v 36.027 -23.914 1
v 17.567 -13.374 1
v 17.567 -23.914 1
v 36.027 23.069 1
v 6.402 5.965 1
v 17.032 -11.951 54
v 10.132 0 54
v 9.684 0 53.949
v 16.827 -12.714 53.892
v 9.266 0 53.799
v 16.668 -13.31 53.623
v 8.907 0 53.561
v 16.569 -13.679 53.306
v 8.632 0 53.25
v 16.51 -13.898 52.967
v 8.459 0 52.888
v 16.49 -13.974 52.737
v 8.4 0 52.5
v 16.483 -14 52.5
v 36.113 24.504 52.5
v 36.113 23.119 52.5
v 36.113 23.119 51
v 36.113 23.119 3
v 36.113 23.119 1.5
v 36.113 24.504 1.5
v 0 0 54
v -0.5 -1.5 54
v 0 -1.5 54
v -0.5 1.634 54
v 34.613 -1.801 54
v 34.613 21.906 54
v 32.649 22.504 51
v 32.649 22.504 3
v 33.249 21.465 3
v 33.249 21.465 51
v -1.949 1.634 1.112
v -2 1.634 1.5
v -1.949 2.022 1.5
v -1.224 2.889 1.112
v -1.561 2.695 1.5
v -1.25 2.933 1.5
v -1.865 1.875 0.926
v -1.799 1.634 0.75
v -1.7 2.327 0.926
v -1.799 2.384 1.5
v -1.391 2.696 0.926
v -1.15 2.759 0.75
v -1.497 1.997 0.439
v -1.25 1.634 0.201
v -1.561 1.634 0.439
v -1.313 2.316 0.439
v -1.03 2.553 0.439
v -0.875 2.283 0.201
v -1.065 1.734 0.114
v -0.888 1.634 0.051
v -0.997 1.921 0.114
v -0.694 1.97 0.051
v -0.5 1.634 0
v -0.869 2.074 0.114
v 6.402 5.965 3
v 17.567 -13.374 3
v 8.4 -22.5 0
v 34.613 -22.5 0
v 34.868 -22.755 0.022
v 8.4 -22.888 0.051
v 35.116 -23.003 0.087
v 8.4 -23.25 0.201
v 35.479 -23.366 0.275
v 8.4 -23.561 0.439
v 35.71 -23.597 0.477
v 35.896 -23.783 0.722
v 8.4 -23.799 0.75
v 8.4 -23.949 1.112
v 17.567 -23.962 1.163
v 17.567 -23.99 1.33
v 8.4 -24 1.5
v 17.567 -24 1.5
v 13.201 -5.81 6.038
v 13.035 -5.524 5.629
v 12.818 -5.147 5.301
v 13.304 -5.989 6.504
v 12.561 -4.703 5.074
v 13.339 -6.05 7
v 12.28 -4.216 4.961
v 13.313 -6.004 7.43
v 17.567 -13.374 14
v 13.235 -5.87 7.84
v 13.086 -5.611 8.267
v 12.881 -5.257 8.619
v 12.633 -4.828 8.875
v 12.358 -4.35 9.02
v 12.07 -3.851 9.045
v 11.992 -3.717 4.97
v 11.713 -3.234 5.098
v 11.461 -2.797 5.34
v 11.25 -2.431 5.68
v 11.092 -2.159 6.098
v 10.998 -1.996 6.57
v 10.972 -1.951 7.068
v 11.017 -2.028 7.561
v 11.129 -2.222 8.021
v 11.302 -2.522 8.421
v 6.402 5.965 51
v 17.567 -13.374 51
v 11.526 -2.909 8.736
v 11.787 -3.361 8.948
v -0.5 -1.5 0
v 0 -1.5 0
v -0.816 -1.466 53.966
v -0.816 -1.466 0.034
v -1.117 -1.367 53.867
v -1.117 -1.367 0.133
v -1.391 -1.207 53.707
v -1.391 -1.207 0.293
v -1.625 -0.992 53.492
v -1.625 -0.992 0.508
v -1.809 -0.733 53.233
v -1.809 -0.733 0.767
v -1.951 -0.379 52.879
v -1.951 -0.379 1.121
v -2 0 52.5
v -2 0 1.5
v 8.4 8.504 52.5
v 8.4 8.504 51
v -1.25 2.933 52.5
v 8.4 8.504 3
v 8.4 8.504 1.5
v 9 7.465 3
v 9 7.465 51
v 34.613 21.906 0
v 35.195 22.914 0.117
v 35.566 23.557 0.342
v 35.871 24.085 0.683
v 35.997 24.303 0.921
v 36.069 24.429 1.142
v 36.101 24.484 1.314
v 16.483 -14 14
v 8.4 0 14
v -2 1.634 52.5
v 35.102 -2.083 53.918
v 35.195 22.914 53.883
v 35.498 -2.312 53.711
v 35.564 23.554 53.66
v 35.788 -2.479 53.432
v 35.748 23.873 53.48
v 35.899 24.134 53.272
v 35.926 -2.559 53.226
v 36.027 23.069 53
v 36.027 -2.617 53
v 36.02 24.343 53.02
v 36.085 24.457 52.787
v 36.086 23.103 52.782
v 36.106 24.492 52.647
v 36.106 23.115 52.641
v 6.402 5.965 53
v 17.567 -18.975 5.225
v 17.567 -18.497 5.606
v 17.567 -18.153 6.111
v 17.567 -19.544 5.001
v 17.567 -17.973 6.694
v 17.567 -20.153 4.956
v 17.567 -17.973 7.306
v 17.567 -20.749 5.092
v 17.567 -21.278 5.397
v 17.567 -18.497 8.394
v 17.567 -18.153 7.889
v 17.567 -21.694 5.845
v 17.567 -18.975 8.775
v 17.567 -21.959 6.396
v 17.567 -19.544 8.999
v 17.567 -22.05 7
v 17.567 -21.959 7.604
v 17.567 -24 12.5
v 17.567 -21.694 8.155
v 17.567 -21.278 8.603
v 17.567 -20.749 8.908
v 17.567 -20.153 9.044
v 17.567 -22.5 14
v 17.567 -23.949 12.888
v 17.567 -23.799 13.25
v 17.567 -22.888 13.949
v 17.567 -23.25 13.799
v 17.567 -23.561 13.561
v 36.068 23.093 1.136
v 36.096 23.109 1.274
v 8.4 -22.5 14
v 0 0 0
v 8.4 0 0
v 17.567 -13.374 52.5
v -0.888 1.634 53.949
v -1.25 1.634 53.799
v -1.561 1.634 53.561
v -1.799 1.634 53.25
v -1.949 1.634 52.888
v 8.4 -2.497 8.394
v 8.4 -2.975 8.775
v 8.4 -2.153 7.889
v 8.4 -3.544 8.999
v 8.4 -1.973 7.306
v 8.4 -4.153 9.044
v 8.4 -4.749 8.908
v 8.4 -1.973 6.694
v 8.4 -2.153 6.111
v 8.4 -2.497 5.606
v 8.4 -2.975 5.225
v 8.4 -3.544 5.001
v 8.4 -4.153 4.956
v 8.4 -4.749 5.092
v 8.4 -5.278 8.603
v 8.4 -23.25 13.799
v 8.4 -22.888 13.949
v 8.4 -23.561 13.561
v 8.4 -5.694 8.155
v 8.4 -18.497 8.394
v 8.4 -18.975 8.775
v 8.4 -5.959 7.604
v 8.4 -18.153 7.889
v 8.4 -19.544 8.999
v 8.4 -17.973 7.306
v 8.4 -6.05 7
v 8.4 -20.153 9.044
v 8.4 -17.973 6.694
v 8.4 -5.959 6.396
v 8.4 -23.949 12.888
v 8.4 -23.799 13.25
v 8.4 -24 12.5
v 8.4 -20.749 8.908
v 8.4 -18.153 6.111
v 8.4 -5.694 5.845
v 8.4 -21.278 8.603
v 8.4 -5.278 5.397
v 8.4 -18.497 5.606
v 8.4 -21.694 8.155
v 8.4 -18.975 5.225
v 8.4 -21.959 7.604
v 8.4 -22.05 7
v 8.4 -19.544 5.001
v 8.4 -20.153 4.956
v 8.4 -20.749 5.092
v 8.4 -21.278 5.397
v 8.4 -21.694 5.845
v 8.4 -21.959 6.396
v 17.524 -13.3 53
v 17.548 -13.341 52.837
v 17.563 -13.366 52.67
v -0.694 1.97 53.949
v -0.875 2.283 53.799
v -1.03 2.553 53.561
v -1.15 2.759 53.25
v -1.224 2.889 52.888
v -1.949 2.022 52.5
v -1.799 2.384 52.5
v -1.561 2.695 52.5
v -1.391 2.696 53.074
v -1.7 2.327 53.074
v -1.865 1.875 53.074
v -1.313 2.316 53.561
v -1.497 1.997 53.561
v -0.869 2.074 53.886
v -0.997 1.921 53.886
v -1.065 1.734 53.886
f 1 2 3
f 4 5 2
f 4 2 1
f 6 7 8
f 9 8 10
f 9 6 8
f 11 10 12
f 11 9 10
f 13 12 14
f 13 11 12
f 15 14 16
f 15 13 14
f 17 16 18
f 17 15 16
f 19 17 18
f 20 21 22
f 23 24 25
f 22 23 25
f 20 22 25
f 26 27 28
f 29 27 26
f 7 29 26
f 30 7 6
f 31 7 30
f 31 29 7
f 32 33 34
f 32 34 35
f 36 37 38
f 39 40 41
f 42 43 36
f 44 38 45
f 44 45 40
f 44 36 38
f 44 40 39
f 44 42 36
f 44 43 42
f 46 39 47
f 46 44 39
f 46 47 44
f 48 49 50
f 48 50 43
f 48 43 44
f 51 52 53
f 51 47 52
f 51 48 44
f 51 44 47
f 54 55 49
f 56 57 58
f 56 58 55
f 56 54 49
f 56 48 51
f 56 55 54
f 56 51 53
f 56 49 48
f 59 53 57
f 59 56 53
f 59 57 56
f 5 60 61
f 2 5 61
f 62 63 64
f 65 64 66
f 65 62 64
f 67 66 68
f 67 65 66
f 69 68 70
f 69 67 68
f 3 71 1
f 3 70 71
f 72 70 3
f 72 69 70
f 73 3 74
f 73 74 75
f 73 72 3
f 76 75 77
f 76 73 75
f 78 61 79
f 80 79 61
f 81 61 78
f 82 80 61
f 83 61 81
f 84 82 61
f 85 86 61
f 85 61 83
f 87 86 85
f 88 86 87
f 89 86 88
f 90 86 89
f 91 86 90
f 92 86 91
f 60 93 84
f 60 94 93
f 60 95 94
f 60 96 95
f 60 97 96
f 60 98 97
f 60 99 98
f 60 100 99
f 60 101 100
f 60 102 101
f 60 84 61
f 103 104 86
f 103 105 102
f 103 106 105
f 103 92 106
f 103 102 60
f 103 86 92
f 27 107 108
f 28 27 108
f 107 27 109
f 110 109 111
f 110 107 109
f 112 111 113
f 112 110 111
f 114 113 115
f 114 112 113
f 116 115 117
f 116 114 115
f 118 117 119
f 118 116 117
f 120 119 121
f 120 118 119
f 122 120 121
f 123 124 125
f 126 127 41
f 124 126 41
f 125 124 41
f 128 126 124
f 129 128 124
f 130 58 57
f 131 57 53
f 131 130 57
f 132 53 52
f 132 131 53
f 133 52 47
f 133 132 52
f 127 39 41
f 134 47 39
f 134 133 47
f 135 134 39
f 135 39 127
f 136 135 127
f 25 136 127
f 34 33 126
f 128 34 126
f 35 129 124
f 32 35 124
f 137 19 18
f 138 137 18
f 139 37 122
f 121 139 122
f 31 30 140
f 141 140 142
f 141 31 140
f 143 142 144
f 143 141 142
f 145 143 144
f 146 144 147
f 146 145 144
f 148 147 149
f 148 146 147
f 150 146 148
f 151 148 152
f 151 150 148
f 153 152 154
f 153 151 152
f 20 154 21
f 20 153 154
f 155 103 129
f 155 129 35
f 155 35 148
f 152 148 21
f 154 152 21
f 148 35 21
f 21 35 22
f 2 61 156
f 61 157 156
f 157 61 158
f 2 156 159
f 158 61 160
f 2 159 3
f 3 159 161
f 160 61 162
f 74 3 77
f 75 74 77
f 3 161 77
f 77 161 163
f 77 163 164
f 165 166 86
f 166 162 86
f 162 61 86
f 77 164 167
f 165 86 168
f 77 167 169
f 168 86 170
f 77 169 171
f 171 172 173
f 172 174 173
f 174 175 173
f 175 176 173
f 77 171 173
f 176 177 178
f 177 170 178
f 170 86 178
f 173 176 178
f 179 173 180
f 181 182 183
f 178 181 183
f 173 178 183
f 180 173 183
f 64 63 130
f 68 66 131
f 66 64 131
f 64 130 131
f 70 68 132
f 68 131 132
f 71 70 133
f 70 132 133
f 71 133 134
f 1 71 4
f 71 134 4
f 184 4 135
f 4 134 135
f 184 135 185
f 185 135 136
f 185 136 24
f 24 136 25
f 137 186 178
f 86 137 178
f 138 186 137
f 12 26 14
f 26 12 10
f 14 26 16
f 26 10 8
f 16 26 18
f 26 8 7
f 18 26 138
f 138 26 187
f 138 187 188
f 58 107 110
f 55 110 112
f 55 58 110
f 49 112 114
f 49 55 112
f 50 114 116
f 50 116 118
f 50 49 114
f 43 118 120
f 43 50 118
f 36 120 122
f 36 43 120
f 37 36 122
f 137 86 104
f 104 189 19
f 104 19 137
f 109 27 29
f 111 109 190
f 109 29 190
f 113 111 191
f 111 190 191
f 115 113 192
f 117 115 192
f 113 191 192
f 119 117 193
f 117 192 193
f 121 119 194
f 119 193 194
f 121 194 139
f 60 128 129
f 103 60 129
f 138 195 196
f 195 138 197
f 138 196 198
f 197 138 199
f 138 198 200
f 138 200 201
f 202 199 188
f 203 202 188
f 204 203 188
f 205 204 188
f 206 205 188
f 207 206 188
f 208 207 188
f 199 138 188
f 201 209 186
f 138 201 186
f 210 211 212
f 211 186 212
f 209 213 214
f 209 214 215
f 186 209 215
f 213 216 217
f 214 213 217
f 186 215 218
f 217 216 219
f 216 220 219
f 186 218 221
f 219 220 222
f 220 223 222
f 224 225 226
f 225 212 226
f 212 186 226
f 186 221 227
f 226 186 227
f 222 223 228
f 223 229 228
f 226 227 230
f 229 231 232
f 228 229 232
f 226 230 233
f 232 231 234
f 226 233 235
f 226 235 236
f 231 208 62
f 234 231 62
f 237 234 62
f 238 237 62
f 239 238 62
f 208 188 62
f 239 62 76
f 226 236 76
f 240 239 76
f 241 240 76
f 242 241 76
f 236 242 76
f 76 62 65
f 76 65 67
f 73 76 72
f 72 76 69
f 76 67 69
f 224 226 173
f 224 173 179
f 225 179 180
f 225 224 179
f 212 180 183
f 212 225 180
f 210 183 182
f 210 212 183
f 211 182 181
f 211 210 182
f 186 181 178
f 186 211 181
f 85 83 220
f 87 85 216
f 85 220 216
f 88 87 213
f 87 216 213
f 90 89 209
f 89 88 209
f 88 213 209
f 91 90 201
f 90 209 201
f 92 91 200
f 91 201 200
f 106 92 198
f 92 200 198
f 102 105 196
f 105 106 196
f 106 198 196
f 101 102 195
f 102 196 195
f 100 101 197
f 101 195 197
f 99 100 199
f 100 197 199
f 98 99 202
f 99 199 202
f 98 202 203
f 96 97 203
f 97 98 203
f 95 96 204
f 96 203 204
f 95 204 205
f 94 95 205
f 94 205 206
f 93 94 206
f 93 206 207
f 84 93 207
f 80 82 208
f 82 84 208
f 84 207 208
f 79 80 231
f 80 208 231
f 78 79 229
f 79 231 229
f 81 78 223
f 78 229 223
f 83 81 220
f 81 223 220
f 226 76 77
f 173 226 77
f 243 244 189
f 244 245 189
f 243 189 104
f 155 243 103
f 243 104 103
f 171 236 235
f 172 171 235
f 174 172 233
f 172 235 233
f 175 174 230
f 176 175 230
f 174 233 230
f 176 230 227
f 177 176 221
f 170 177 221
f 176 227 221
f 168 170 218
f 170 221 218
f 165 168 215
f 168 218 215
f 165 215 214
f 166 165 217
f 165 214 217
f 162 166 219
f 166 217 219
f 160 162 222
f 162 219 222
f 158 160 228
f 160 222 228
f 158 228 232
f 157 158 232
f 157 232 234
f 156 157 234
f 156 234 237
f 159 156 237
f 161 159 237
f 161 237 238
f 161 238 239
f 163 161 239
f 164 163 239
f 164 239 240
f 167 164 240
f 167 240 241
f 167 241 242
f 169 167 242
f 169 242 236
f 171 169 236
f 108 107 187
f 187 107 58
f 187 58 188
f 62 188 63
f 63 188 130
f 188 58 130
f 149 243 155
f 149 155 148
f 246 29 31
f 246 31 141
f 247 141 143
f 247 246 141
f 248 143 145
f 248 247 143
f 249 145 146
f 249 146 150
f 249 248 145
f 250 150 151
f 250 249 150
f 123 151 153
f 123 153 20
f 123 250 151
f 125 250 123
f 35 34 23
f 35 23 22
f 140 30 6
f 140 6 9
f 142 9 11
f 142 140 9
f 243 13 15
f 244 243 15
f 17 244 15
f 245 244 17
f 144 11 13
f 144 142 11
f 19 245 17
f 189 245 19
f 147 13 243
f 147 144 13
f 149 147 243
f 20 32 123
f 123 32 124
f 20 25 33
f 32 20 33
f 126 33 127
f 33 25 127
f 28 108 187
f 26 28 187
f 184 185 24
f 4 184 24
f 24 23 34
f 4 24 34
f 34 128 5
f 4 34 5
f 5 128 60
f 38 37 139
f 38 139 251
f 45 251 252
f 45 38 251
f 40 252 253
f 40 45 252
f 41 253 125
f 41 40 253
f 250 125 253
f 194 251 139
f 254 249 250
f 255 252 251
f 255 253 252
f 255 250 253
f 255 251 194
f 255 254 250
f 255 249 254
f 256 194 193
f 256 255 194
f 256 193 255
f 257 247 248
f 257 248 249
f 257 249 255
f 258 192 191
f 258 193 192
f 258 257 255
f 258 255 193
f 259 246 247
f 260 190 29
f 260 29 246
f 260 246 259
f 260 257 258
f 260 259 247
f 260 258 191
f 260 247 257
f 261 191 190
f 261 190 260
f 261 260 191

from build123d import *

# Parameters (mm, degrees)
F1_DEPTH      = 54
F2_W          = 28
F2_H          = 48
F3_DEPTH      = 50
F4_W          = 36.3328976004
F4_H          = 48
F5_DEPTH      = 3
F6_W          = 5.7282032303
F6_H          = 48
F7_DEPTH      = 20
F9_DEPTH      = 2
F11_DEPTH     = 2
F13_DEPTH     = 40
F15_DEPTH     = 13
F16_R         = 2.05
F17_DEPTH     = 25
F18_T1_DEPTH  = 46.8928601954
F18_T3_DEPTH  = 61.5
F18_T5_DEPTH  = 6.8839745962
F18_T7_DEPTH  = 30.1666666667
F18_T9_DEPTH  = 56.0044427996
F18_T11_DEPTH = 35.2128129211
F18_T13_DEPTH = 51
F18_T15_DEPTH = 16.667359312
F18_T17_DEPTH = 46.8928601954
F18_T19_DEPTH = 34.6711094662
F18_T24_DEPTH = 1.5
F18_T30_DEPTH = 1.5
F18_T36_DEPTH = 23.6658075373


# Not quite as in the source:
# - a fillet or chamfer that OpenCascade refuses, or shapes differently, is made with other operations: its cross-section is extruded or revolved along the edge and cut away or added


with BuildPart() as f1:
    # F0 (on Top) → F1 (new body)
    with BuildSketch(Plane.XY):
        Polygon((0, -1.5), (0, 0), (8.4, 0), (8.4, -24), (36.1128129211, -24), (36.1128129211, 24.5044427996), (8.4, 8.5044427996), (-2, 2.5), (-2, -1.5), align=None)
    extrude(amount=F1_DEPTH)

    # F2 (on face) → F3 (cut)
    with BuildSketch(Plane(origin=(-1.5825317547, 2.7410254038, 0), x_dir=(-0.8660254038, -0.5, 0), z_dir=(-0.5, 0.8660254038, 0))):
        with Locations((-25.5268347916, 27)):
            Rectangle(F2_W, F2_H)
    extrude(amount=-F3_DEPTH, mode=Mode.SUBTRACT)

    # F4 (on face) → F5 (cut)
    with BuildSketch(Plane(origin=(9.9825317547, 5.7634173958, 0), x_dir=(-0.5, 0.8660254038, 0), z_dir=(0.8660254038, 0.5, 0))):
        with Locations((-16.2013852907, 27)):
            Rectangle(F4_W, F4_H)
    extrude(amount=-F5_DEPTH, mode=Mode.SUBTRACT)

    # F6 (on face) → F7 (cut)
    with BuildSketch(Plane(origin=(34.2312430607, 19.7634173958, 0), x_dir=(0.5, -0.8660254038, 0), z_dir=(-0.8660254038, -0.5, 0))):
        with Locations((0.8990381057, 27)):
            Rectangle(F6_W, F6_H)
    extrude(amount=-F7_DEPTH, mode=Mode.SUBTRACT)

    # F8 (on face) → F9 (cut)
    with BuildSketch(Plane(origin=(0, 0, 51), x_dir=(1, 0, 0), z_dir=(0, 0, -1))):
        Polygon((36.1128129211, -23.1188021535), (36.1128129211, 24), (23.7023471851, 24), (6.4019237886, -5.965212315), align=None)
    extrude(amount=-F9_DEPTH, mode=Mode.SUBTRACT)

    # F10 (on face) → F11 (cut)
    with BuildSketch(Plane.XY.offset(3)):
        Polygon((36.1128129211, 23.1188021535), (6.4019237886, 5.965212315), (23.7023471851, -24), (36.1128129211, -24), align=None)
    extrude(amount=-F11_DEPTH, mode=Mode.SUBTRACT)

    # F12 (on face) → F13 (cut)
    with BuildSketch(Plane.XY.offset(54)):
        Polygon((16.4829037687, -14), (8.4, 0), (8.4, -24), (36.1128129211, -24), (36.1128129211, -2.6666666667), align=None)
    extrude(amount=-F13_DEPTH, mode=Mode.SUBTRACT)

    # F14 (on face) → F15 (cut)
    with BuildSketch(Plane.XY.offset(14)):
        Polygon((23.7023471851, -24), (17.567359312, -13.3738893001), (17.567359312, -24), align=None)
    extrude(amount=-F15_DEPTH, mode=Mode.SUBTRACT)

    # F16 (on face) → F17 (cut)
    with BuildSketch(Plane(origin=(8.4, 0, 0), x_dir=(0, -1, 0), z_dir=(-1, 0, 0))):
        with Locations((20, 7)):
            Circle(F16_R)
        with Locations((4, 7)):
            Circle(F16_R)
    extrude(amount=-F17_DEPTH, mode=Mode.SUBTRACT)

    # F18: fillet of radius 1.5 on 12 edges, made by hand

    # F18_s2 → F18_t1 (cut)
    with BuildSketch(Plane(origin=(0.3325317547, 0.1919872981, 0), x_dir=(0, 0, 1), z_dir=(0.8660254038, 0.5, 0))):
        with BuildLine():
            ThreePointArc((54, -1.6650635095), (53.5606601718, -2.7257236812), (52.5, -3.1650635095))
            Line((52.5, -3.1650635095), (54, -3.1650635095))
            Line((54, -3.1650635095), (54, -1.6650635095))
        make_face()
    extrude(amount=F18_T1_DEPTH, mode=Mode.SUBTRACT)

    # F18_s4 → F18_t3 (cut)
    with BuildSketch(Plane.XY.offset(-3.75)):
        with BuildLine():
            ThreePointArc((-0.5, -1.5), (-1.5606601718, -1.0606601718), (-2, 0))
            Line((-2, 0), (-2, -1.5))
            Line((-2, -1.5), (-0.5, -1.5))
        make_face()
    extrude(amount=F18_T3_DEPTH, mode=Mode.SUBTRACT)

    # F18_s6 → F18_t5 (cut)
    with BuildSketch(Plane.XZ.offset(-1.6339745962)):
        with BuildLine():
            ThreePointArc((-0.5, 54), (-1.5606601718, 53.5606601718), (-2, 52.5))
            Line((-2, 52.5), (-2, 54))
            Line((-2, 54), (-0.5, 54))
        make_face()
        with BuildLine():
            ThreePointArc((-0.5, 0), (-1.5606601718, 0.4393398282), (-2, 1.5))
            Line((-2, 1.5), (-2, 0))
            Line((-2, 0), (-0.5, 0))
        make_face()
    extrude(amount=F18_T5_DEPTH, mode=Mode.SUBTRACT)

    # F18_s8 → F18_t7 (cut)
    with BuildSketch(Plane(origin=(29.1775044166, 16.8456400292, 0), x_dir=(0, 0, 1), z_dir=(-0.8660254038, -0.5, 0))):
        with BuildLine():
            ThreePointArc((54, -18.8658075373), (53.5606601718, -19.9264677091), (52.5, -20.3658075373))
            Line((52.5, -20.3658075373), (54, -20.3658075373))
            Line((54, -20.3658075373), (54, -18.8658075373))
        make_face()
    extrude(amount=F18_T7_DEPTH, mode=Mode.SUBTRACT)

    # F18_s10 → F18_t9 (cut)
    with BuildSketch(Plane.XZ.offset(-28.2544427996)):
        with BuildLine():
            ThreePointArc((34.6128129211, 0), (35.6734730929, 0.4393398282), (36.1128129211, 1.5))
            Line((36.1128129211, 1.5), (36.1128129211, 0))
            Line((36.1128129211, 0), (34.6128129211, 0))
        make_face()
    extrude(amount=F18_T9_DEPTH, mode=Mode.SUBTRACT)

    # F18_s12 → F18_t11 (cut)
    with BuildSketch(Plane.YZ.offset(4.65)):
        with BuildLine():
            ThreePointArc((-22.5, 0), (-23.5606601718, 0.4393398282), (-24, 1.5))
            Line((-24, 1.5), (-24, 0))
            Line((-24, 0), (-22.5, 0))
        make_face()
    extrude(amount=F18_T11_DEPTH, mode=Mode.SUBTRACT)

    # F18_s14 → F18_t13 (cut)
    with BuildSketch(Plane.XY.offset(1.5)):
        with BuildLine():
            ThreePointArc((-2, 1.6339745962), (-1.7990381057, 2.3839745962), (-1.25, 2.9330127019))
            Line((-1.25, 2.9330127019), (-2, 2.5))
            Line((-2, 2.5), (-2, 1.6339745962))
        make_face()
    extrude(amount=F18_T13_DEPTH, mode=Mode.SUBTRACT)

    # F18_s16 → F18_t15 (cut)
    with BuildSketch(Plane.YZ.offset(4.65)):
        with BuildLine():
            ThreePointArc((-24, 12.5), (-23.5606601718, 13.5606601718), (-22.5, 14))
            Line((-22.5, 14), (-24, 14))
            Line((-24, 14), (-24, 12.5))
        make_face()
    extrude(amount=F18_T15_DEPTH, mode=Mode.SUBTRACT)

    # F18_s18 → F18_t17 (cut)
    with BuildSketch(Plane(origin=(40.94293994, 23.6384173958, 0), x_dir=(0, 0, 1), z_dir=(-0.8660254038, -0.5, 0))):
        with BuildLine():
            ThreePointArc((0, 1.6650635095), (0.4393398282, 2.7257236812), (1.5, 3.1650635095))
            Line((1.5, 3.1650635095), (0, 3.1650635095))
            Line((0, 3.1650635095), (0, 1.6650635095))
        make_face()
    extrude(amount=F18_T17_DEPTH, mode=Mode.SUBTRACT)

    # F18_s20 → F18_t19 (cut)
    with BuildSketch(Plane.XZ.offset(-28.2544427996)):
        with BuildLine():
            ThreePointArc((34.6128129211, 54), (35.6734730929, 53.5606601718), (36.1128129211, 52.5))
            Line((36.1128129211, 52.5), (36.1128129211, 54))
            Line((36.1128129211, 54), (34.6128129211, 54))
        make_face()
    extrude(amount=F18_T19_DEPTH, mode=Mode.SUBTRACT)


with BuildPart() as f18_tool22:
    # F18_s23 → F18_t24 (new body)
    with BuildSketch(Plane.XY.offset(52.5)):
        Polygon((-0.5, 1.6339745962), (-2, 1.6339745962), (-2, 2.5), (-1.25, 2.9330127019), align=None)
    extrude(amount=F18_T24_DEPTH)

    # F18_s25 → F18_t26 (revolve, cut)
    with BuildSketch(Plane(origin=(-0.5, 1.6339745962, 52.5), x_dir=(0.8660254038, -0.5, 0), z_dir=(-0.5, -0.8660254038, 0))):
        with BuildLine():
            ThreePointArc((0, -1.5), (1.5, 0), (0, 1.5))
            Line((0, 1.5), (0, -1.5))
        make_face()
    revolve(axis=Axis((-0.5, 1.6339745962, 52.5), (0, 0, 1)), mode=Mode.SUBTRACT)


with BuildPart() as f1_1:
    add(f1.part)

    # F18_t21: cut F18_tool22
    add(f18_tool22.part, mode=Mode.SUBTRACT)


with BuildPart() as f18_tool28:
    # F18_s29 → F18_t30 (new body)
    with BuildSketch(Plane.XY.offset(1.5)):
        Polygon((-0.5, 1.6339745962), (-2, 1.6339745962), (-2, 2.5), (-1.25, 2.9330127019), align=None)
    extrude(amount=-F18_T30_DEPTH)

    # F18_s31 → F18_t32 (revolve, cut)
    with BuildSketch(Plane(origin=(-0.5, 1.6339745962, 1.5), x_dir=(0.8660254038, -0.5, 0), z_dir=(0.5, 0.8660254038, 0))):
        with BuildLine():
            ThreePointArc((0, -1.5), (1.5, 0), (0, 1.5))
            Line((0, 1.5), (0, -1.5))
        make_face()
    revolve(axis=Axis((-0.5, 1.6339745962, 1.5), (0, 0, -1)), mode=Mode.SUBTRACT)


with BuildPart() as f1_2:
    add(f1_1.part)

    # F18_t27: cut F18_tool28
    add(f18_tool28.part, mode=Mode.SUBTRACT)


with BuildPart() as f18_tool34:
    # F18_s35 → F18_t36 (new body)
    with BuildSketch(Plane(origin=(12.0579037687, -20.8849019601, 0), x_dir=(0, 0, 1), z_dir=(-0.5, 0.8660254038, 0))):
        with BuildLine():
            ThreePointArc((54, 8.7746133918), (53.5606601718, 7.71395322), (52.5, 7.2746133918))
            Line((52.5, 7.2746133918), (54, 7.2746133918))
            Line((54, 7.2746133918), (54, 8.7746133918))
        make_face()
    extrude(amount=F18_T36_DEPTH)

    split(bisect_by=Plane.XZ, keep=Keep.TOP)


with BuildPart() as f1_3:
    add(f1_2.part)

    # F18_t33: cut F18_tool34
    add(f18_tool34.part, mode=Mode.SUBTRACT)


solid = f1_3.part
